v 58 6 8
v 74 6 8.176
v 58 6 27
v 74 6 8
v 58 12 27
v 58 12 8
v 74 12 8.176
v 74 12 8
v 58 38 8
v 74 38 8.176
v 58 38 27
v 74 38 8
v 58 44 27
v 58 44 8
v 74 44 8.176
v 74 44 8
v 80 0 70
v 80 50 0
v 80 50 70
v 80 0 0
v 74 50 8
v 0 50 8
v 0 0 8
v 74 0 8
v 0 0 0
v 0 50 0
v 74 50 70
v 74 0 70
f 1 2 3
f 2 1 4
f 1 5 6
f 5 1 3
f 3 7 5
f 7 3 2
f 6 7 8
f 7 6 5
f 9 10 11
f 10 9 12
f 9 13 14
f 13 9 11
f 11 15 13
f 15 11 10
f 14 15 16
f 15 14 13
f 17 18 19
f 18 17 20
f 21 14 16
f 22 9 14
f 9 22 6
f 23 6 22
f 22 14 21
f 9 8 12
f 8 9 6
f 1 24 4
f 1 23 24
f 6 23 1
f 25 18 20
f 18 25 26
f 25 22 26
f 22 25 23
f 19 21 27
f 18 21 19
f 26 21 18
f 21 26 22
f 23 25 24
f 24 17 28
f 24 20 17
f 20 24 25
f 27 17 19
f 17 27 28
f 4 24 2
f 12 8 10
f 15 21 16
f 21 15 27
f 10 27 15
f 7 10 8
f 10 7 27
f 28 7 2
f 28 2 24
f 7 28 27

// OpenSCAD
$fn = 32;

// ----------------------------------------------------------------------
// Rib bracket: 2-gusset L bracket
// ----------------------------------------------------------------------

// --- parameters (mm) ---
base_l = 80;              // foot length, X
base_w = 50;              // foot width, Y
base_t = 8;               // foot thickness
plate_t = 6;              // upright plate thickness
plate_h = 70;             // overall height
gus_l = 16;               // gusset leg along the foot
gus_h = 20;               // gusset height
gus_t = 6;                // gusset thickness
gus_edge = 6;             // gusset margin from the foot edge
n_gus = 2;                // gusset count

gus_pitch = (base_w - 2 * gus_edge - gus_t) / (n_gus - 1);  // gusset pitch

union() {
  cube([base_l, base_w, base_t]);
  translate([base_l - plate_t, 0, base_t - 1])
    cube([plate_t, base_w, plate_h - base_t + 1]);
  for (i = [0 : n_gus - 1])
    translate([base_l - plate_t - gus_l, gus_edge + i * gus_pitch, base_t - 1])
      rotate([-90, 0, 0])
        linear_extrude(height = gus_t)
          polygon(points = [[0, 0], [gus_l + 1, 0], [0, -gus_h]]);
}
